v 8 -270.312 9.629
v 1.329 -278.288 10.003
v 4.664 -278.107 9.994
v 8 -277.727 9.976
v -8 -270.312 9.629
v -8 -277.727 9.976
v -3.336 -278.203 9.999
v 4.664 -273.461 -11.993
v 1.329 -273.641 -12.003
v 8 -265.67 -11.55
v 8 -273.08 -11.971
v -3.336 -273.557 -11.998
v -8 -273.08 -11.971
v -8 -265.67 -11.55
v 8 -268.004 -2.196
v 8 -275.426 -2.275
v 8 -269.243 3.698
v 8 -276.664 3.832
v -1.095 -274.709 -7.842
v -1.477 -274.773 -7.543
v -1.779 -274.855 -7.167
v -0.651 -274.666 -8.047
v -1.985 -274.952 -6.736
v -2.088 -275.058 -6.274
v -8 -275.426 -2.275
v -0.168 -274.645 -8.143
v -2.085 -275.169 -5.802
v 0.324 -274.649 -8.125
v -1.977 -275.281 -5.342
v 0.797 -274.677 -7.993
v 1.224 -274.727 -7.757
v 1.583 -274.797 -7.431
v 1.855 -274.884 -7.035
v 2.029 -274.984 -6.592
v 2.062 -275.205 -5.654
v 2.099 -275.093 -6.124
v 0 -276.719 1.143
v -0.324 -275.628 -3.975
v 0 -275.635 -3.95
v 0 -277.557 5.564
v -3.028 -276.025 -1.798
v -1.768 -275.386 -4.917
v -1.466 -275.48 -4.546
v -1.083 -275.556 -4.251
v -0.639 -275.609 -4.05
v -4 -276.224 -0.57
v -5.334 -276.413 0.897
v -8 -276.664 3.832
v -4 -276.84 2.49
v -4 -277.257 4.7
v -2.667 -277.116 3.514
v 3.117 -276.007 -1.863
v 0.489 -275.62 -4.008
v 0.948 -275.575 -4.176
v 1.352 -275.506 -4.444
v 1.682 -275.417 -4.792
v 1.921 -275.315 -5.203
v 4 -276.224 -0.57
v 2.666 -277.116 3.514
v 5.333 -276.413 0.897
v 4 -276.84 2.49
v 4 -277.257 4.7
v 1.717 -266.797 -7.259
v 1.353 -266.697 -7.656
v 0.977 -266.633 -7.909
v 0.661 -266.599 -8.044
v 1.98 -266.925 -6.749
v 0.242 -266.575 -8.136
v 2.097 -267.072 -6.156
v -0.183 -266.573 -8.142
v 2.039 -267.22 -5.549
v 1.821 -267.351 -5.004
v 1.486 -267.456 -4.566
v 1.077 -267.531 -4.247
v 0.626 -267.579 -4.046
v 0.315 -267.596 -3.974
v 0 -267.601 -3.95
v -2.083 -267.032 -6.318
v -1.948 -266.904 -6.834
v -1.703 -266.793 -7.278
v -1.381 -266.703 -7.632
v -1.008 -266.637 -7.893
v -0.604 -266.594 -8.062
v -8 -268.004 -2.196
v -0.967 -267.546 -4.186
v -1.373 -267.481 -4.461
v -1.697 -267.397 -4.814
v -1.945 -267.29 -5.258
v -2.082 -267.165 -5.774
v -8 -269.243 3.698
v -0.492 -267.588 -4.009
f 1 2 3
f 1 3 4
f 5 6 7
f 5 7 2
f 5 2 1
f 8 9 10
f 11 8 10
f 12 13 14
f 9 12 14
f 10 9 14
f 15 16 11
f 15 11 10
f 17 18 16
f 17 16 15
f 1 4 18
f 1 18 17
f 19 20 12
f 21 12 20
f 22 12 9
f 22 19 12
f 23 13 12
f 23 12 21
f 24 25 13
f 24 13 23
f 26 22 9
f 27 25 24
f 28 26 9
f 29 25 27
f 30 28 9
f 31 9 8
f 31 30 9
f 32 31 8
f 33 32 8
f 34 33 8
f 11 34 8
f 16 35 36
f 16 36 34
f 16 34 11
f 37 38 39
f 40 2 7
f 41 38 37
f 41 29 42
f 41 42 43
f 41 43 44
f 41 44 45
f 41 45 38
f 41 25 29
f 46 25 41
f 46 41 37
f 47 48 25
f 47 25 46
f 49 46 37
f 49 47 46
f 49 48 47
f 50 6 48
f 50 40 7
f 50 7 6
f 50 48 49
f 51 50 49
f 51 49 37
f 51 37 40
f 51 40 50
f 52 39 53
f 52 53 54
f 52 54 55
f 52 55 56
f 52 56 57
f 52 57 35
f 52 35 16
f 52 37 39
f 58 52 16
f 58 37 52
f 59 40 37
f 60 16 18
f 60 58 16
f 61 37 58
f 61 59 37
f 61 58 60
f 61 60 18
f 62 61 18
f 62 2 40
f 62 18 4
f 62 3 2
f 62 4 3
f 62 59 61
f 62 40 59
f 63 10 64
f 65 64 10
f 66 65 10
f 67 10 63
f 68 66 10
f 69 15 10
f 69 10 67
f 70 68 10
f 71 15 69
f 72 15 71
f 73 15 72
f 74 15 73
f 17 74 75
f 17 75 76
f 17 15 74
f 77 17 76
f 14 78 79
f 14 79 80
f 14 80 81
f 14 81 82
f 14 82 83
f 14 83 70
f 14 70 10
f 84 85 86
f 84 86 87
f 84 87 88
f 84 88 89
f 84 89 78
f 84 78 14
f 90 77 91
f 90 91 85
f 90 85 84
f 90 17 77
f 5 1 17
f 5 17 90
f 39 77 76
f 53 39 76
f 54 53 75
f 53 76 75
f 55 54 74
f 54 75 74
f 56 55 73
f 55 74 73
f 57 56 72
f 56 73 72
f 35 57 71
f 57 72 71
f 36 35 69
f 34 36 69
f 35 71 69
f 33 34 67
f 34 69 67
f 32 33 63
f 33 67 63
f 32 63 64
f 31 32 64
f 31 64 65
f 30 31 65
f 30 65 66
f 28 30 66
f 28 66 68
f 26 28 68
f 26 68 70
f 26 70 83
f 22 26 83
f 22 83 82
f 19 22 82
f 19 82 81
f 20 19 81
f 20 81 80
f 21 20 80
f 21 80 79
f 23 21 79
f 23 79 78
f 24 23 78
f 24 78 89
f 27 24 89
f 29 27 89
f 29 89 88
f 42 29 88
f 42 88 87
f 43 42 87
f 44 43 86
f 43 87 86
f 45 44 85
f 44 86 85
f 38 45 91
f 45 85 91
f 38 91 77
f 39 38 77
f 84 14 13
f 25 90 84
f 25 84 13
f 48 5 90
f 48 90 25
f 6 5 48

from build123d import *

# Parameters (mm, degrees)
SKETCH8_R          = 2.1
CUT_EXTRUDE2_DEPTH = 20.175814847


with BuildPart() as part:
    # Sweep1: sweep along a path in Sketch5
    with BuildLine() as sweep1_path:  # in the path sketch's own coordinates; laid on its plane below (add() does not lay a ready-made edge on the line's plane)
        add(Edge.make_bspline(
            [(12, -273.587448275), (1.118694171, -276.48109121), (-10, -278.234045614)],
            knots=[0, 0, 0, 1, 1, 1], degree=2))
    # Sketch2 → Sweep1 (sweep)
    with BuildSketch(Plane.XY):
        with BuildLine():
            Line((7.999671005, -275.908898325), (7.999671005, -268.48657561))
            Line((7.999671005, -268.48657561), (-8.000328995, -268.48657561))
            Line((-8.000328995, -268.48657561), (-8.000328995, -275.908898325))
            add(Edge.make_bspline(
                [(7.999671005, -275.908898325), (-0.000325582, -277.064252884), (-8.000328995, -275.908898325)],
                knots=[0, 0, 0, 1, 1, 1], degree=2))
        make_face()
    sweep(path=Plane(origin=(0, 0, 0), x_dir=(0, 0, -1), z_dir=(1, 0, 0)) * sweep1_path.line)

    # Sketch8 → Cut-Extrude2 (cut, through all)
    with BuildSketch(Plane(origin=(0, -265.669886224, 0), x_dir=(1, 0, 0), z_dir=(0, 1, 0))):
        with Locations(Location((-4.6e-08, 6.050192376, 0), (0, 0, 270))):
            Circle(SKETCH8_R)
    extrude(amount=-CUT_EXTRUDE2_DEPTH, mode=Mode.SUBTRACT)


solid = part.part
